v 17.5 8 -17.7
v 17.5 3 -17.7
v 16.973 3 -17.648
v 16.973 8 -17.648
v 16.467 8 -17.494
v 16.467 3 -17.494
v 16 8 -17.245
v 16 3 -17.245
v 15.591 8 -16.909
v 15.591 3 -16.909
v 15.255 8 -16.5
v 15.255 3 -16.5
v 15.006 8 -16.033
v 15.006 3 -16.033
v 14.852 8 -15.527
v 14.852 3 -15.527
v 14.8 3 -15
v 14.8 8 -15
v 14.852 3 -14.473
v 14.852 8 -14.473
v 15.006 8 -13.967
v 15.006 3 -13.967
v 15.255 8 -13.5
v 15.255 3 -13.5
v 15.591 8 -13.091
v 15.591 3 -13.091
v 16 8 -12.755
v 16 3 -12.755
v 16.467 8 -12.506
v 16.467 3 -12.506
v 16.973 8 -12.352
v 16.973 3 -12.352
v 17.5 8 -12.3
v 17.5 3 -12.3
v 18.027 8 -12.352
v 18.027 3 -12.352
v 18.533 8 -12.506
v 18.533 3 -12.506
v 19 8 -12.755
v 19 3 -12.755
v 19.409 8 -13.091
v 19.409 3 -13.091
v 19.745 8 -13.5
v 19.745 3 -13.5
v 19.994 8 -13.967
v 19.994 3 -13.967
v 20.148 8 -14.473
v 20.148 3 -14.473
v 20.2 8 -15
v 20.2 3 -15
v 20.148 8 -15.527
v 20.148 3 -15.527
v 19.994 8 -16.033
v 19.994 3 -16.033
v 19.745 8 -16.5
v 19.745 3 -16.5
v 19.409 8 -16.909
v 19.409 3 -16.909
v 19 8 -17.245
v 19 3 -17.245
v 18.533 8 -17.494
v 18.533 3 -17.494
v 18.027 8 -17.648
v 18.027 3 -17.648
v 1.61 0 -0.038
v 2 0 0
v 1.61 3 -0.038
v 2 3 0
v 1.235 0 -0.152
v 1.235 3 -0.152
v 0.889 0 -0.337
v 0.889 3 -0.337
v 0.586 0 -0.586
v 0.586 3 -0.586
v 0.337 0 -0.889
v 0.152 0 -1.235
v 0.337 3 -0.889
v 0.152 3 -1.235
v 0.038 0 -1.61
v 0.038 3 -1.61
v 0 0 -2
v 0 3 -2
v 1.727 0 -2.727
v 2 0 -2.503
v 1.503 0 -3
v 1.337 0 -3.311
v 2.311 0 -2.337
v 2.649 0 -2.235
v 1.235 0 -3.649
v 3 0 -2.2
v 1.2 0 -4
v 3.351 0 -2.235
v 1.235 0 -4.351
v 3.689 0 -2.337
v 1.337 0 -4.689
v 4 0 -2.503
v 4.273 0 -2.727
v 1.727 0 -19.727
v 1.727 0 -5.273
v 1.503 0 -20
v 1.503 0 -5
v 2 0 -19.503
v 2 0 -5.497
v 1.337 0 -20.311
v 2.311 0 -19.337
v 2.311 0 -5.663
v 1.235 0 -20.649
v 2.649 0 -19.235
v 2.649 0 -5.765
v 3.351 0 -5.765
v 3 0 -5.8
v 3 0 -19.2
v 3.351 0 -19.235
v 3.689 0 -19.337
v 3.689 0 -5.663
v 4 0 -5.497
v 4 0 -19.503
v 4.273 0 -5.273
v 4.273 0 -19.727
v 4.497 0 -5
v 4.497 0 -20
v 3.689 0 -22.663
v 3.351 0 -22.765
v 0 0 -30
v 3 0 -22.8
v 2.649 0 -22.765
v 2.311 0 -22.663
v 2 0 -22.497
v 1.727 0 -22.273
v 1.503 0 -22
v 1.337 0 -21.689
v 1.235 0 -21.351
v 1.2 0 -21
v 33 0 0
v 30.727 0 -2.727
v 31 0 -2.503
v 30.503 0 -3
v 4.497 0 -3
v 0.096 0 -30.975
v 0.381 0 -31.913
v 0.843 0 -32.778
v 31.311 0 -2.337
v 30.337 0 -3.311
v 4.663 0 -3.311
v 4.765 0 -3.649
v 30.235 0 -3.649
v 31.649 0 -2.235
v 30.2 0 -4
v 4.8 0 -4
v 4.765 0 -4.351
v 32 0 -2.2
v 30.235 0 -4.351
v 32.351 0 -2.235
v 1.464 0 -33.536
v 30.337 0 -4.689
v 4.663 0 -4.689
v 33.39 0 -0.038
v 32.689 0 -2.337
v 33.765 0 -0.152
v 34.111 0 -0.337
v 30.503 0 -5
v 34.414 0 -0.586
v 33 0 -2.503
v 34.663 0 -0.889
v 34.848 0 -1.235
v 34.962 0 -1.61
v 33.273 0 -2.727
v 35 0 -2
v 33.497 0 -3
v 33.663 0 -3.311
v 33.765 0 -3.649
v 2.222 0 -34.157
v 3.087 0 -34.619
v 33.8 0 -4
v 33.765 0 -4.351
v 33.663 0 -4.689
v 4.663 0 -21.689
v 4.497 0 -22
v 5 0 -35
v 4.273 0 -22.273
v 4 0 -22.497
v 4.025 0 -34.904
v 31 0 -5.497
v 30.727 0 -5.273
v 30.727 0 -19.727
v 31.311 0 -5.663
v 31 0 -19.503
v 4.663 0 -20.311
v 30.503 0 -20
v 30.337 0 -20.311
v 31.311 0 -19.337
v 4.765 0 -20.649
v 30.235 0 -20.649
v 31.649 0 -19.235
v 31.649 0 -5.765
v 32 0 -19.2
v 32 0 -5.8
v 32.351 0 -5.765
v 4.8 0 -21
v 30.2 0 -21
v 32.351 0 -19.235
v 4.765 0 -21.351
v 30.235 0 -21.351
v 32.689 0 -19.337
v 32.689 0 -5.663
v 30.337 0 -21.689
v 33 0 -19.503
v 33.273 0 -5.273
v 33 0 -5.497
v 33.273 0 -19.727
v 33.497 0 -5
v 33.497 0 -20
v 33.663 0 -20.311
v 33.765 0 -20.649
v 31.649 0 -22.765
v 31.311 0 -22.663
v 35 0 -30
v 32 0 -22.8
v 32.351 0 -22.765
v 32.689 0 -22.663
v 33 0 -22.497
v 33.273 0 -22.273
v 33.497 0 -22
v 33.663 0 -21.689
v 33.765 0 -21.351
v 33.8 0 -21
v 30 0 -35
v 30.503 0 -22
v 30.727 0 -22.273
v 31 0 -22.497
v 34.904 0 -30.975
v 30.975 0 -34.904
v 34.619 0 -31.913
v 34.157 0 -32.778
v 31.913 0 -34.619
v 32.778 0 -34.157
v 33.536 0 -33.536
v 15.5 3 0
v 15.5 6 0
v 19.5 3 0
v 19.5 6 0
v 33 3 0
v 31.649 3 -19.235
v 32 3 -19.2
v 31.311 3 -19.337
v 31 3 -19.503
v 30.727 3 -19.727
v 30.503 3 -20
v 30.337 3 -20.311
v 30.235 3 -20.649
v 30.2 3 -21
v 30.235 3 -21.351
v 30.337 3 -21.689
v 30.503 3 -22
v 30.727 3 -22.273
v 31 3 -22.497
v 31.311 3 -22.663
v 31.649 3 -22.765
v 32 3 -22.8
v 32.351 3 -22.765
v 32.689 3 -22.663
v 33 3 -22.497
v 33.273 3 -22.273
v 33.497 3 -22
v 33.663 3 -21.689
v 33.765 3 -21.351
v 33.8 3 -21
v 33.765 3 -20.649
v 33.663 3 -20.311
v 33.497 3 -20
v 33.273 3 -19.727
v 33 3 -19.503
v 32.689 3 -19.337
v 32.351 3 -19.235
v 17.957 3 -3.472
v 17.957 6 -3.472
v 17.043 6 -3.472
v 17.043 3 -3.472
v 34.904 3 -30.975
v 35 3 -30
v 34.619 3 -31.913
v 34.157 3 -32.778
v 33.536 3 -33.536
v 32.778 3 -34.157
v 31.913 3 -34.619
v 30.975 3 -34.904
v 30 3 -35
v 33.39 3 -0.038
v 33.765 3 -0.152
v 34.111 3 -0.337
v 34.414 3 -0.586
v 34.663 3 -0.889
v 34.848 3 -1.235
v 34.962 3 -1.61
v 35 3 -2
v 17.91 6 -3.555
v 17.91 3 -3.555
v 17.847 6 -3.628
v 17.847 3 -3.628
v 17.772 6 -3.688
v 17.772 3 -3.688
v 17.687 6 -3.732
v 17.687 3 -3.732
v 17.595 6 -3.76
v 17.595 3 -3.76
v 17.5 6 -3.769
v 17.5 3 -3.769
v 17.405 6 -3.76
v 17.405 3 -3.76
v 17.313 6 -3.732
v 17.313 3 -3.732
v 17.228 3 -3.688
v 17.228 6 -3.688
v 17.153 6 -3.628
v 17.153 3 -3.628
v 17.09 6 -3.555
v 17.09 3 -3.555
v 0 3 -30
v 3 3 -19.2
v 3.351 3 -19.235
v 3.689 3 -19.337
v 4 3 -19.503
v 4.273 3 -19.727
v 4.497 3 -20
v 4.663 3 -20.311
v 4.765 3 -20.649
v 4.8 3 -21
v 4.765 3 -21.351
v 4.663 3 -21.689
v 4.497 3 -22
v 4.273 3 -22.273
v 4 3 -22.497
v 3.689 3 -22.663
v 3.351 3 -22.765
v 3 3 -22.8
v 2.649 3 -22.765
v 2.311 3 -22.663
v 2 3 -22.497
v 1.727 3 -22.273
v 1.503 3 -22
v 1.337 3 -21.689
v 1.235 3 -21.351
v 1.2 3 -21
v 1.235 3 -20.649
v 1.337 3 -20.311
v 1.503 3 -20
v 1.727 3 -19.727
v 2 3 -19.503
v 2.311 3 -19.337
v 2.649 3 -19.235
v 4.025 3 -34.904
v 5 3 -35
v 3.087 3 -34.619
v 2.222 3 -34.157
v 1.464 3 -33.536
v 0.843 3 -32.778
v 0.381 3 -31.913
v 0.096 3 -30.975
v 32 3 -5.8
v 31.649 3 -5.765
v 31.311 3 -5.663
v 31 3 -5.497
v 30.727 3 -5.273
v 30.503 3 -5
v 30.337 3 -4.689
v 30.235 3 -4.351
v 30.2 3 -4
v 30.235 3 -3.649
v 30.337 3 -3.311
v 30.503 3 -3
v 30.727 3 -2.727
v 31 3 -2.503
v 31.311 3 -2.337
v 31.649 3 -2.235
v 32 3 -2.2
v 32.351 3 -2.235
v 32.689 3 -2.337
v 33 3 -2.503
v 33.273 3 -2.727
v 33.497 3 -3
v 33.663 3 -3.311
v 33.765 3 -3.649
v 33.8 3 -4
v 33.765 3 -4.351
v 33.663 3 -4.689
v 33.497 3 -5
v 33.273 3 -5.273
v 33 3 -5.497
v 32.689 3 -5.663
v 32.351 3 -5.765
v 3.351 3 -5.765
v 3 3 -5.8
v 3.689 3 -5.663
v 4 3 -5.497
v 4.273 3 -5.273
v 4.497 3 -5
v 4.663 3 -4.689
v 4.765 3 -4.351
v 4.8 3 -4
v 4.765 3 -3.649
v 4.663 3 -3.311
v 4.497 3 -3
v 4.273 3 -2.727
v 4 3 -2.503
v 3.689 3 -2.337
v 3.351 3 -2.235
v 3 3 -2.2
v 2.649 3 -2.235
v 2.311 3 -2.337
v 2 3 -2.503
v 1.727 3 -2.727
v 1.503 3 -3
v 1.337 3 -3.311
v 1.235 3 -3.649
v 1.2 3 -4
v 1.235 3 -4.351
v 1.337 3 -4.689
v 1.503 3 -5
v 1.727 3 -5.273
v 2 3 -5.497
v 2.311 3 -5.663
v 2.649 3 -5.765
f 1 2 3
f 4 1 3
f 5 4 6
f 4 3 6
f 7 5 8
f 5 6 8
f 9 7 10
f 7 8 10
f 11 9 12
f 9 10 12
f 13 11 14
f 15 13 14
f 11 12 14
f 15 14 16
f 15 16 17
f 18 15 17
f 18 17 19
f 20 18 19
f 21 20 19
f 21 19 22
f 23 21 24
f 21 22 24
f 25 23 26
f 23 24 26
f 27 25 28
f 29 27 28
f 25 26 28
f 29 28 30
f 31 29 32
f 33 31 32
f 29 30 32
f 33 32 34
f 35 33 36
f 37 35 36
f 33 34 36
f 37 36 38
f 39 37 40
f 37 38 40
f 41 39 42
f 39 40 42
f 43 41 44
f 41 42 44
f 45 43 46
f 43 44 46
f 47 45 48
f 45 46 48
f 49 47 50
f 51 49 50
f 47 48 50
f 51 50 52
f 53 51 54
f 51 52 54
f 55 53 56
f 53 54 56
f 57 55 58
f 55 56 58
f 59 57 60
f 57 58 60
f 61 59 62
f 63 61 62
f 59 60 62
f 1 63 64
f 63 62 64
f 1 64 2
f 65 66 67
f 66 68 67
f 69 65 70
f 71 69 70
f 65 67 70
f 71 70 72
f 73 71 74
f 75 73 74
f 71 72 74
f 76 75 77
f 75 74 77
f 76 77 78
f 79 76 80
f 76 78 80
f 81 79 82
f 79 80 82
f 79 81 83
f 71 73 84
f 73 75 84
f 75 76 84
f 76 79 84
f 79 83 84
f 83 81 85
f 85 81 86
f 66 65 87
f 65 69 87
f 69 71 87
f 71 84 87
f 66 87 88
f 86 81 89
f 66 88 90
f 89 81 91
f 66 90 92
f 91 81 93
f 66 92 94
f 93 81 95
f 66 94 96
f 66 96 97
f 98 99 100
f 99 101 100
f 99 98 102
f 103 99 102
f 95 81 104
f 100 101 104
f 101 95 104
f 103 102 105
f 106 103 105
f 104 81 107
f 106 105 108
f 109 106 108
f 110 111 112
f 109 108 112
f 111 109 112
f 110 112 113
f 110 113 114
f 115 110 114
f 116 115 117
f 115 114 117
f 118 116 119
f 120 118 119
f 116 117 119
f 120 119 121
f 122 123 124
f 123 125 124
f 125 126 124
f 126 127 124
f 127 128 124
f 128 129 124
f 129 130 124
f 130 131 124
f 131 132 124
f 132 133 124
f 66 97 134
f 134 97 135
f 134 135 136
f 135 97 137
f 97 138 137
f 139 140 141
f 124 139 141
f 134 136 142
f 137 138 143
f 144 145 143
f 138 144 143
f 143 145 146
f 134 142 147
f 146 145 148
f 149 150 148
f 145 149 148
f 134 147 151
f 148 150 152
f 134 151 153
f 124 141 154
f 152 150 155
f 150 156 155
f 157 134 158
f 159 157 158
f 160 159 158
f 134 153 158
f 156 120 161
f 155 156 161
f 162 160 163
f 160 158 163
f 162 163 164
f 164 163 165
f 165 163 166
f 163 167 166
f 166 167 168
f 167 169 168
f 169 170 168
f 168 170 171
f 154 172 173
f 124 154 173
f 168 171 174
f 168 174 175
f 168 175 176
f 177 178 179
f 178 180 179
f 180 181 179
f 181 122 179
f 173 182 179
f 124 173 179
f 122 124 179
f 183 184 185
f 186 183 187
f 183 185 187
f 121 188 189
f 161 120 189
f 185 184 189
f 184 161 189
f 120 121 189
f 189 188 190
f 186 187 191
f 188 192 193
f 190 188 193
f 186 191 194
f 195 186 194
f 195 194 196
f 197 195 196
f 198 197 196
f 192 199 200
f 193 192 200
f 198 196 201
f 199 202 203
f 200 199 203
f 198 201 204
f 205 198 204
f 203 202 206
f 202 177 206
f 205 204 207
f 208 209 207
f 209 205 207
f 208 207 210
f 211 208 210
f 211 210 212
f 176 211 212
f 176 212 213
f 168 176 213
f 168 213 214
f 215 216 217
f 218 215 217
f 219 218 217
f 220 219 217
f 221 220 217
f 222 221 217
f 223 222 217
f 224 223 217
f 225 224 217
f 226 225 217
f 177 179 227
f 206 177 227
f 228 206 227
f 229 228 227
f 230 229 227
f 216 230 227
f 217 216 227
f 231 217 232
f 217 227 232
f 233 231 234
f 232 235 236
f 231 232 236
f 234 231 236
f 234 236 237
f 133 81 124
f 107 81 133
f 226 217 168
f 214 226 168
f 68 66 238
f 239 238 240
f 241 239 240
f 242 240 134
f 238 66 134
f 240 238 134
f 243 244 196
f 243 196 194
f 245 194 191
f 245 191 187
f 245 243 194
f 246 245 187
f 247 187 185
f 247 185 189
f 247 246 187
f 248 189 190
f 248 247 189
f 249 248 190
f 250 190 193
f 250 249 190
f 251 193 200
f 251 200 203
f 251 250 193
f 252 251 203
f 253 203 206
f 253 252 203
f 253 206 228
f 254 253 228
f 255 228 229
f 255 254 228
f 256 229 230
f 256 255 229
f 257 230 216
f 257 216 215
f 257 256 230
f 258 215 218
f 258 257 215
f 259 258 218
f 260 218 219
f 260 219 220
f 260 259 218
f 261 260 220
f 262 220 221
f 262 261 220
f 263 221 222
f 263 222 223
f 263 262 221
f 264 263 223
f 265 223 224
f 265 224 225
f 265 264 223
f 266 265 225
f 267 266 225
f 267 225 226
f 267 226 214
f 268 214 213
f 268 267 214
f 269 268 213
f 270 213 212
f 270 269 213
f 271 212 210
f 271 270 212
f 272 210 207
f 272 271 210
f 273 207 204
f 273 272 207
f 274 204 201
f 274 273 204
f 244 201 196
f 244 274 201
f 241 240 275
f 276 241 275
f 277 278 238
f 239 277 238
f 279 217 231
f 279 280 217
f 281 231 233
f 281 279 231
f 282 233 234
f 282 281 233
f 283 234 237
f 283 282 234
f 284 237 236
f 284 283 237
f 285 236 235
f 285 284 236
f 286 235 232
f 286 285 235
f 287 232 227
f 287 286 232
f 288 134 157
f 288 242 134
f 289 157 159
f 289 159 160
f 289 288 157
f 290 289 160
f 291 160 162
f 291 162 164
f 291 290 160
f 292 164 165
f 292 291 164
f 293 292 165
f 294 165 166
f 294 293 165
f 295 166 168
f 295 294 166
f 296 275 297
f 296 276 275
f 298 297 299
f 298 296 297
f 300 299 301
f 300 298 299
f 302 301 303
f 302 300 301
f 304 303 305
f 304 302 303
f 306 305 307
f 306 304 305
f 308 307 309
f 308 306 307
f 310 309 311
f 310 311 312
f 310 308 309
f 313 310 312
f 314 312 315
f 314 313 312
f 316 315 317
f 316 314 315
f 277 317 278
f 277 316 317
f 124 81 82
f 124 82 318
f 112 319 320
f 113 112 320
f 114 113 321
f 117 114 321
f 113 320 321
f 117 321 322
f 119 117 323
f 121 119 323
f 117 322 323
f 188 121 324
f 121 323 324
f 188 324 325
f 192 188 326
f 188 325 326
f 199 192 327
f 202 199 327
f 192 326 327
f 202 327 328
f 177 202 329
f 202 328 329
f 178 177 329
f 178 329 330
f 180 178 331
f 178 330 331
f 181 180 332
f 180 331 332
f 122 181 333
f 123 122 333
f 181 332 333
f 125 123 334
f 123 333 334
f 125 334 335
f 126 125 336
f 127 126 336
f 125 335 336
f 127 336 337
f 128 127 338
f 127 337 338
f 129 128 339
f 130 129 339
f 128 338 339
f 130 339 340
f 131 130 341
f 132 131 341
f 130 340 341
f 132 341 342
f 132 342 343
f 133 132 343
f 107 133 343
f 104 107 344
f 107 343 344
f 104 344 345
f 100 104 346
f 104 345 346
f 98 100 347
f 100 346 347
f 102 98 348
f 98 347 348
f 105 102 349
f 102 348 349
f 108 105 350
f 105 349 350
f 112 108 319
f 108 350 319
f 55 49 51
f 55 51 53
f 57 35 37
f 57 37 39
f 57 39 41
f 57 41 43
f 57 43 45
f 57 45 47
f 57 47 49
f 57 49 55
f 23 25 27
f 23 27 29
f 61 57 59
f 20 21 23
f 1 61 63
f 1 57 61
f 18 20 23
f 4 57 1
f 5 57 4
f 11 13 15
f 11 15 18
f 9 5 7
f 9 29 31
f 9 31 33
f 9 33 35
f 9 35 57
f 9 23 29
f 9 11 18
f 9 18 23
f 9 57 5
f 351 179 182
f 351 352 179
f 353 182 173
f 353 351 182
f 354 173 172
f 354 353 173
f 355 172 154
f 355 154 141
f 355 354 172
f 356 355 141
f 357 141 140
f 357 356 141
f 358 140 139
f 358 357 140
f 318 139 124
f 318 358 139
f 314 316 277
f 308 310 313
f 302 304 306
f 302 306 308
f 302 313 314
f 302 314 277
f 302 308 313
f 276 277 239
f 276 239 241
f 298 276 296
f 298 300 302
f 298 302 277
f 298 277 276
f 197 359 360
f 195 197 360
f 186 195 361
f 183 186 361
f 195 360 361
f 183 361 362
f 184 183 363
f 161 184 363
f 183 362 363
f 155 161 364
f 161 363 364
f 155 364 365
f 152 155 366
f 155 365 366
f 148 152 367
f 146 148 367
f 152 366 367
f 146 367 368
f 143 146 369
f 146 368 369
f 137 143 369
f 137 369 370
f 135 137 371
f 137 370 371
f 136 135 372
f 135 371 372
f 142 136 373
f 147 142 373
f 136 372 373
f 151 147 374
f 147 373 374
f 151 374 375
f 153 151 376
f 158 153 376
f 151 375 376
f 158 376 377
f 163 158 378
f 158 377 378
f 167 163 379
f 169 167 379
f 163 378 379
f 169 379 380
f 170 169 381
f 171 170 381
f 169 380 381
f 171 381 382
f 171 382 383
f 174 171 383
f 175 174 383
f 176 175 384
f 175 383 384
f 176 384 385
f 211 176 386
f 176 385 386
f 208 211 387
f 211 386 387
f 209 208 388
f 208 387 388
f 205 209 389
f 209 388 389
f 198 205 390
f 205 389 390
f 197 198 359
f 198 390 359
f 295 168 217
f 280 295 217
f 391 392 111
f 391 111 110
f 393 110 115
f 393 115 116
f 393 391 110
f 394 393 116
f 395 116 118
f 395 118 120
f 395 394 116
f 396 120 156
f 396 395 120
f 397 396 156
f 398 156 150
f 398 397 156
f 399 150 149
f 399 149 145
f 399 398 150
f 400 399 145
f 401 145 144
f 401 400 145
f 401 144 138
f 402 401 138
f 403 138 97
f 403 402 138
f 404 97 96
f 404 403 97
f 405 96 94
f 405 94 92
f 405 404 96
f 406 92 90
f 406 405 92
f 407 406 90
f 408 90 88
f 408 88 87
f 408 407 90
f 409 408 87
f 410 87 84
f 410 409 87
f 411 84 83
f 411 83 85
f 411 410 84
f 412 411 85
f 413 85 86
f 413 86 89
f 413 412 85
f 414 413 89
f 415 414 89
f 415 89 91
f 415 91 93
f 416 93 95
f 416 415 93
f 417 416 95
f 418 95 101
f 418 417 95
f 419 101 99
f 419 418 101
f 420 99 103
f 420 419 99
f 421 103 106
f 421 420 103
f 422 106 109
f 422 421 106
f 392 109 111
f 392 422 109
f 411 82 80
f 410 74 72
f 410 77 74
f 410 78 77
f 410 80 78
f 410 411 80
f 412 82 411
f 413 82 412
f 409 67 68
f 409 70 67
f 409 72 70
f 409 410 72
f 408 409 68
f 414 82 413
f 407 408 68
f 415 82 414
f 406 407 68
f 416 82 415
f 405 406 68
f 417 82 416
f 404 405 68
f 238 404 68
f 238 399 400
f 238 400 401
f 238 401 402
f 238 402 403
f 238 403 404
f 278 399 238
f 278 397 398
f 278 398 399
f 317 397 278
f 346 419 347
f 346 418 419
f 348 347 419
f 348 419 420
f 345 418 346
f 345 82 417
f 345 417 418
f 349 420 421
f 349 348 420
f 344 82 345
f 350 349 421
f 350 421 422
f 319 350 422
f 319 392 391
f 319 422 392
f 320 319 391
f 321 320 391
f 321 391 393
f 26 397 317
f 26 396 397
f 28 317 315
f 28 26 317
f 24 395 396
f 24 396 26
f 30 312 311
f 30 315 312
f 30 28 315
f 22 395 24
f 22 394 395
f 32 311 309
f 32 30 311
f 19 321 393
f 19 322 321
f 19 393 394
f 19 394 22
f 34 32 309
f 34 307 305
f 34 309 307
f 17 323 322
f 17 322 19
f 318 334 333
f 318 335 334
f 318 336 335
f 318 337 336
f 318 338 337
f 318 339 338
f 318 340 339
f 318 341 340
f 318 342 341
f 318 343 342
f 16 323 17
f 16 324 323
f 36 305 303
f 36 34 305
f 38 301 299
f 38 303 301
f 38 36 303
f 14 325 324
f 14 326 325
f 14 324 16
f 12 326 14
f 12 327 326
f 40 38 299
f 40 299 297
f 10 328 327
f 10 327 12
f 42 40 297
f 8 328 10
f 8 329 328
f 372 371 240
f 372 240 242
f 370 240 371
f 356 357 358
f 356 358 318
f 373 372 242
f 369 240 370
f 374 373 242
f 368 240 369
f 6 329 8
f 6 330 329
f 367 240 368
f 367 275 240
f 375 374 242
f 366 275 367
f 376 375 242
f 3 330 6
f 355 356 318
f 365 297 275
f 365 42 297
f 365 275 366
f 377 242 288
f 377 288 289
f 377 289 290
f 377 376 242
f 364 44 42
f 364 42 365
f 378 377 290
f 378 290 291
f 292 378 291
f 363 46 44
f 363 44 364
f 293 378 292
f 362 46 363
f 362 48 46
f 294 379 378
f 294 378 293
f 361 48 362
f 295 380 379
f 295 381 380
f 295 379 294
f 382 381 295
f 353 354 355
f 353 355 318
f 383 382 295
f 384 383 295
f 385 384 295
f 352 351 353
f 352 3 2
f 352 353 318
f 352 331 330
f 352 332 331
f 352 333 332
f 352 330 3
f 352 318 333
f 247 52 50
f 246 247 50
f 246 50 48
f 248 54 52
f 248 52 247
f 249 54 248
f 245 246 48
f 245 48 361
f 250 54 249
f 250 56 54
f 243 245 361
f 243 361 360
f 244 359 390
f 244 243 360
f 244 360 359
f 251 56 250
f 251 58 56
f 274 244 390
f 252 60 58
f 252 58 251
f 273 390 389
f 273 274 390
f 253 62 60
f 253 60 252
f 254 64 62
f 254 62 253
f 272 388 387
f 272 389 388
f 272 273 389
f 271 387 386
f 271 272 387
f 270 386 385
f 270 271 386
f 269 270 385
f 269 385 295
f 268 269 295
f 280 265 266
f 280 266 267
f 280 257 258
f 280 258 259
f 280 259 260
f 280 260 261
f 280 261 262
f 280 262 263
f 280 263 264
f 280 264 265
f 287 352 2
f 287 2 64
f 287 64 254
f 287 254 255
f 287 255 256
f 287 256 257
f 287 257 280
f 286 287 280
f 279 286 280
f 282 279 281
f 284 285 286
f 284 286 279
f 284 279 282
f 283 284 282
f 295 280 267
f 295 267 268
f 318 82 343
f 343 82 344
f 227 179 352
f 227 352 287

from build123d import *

# Parameters (mm, degrees)
SKETCH1_W               = 35
SKETCH1_H               = 35
BOSS_EXTRUDE1_DEPTH     = 3
SKETCH3_R               = 1.8
CUT_EXTRUDE2_DEPTH      = 3
MIRROR2_COPY_1_SKETCH_R = 1.8
MIRROR2_COPY_1_DEPTH    = 3
SKETCH2_R               = 2.7
BOSS_EXTRUDE2_DEPTH     = 5
BOSS_EXTRUDE3_DEPTH     = 3
FILLET2_R               = 0.5
FILLET3_R               = 2
FILLET4_R               = 5


with BuildPart() as part:
    # Sketch1 → Boss-Extrude1 (new body)
    with BuildSketch(Plane(origin=(0, 0, 0), x_dir=(1, 0, 0), z_dir=(0, 1, 0))):
        with Locations((17.5, 17.5)):
            Rectangle(SKETCH1_W, SKETCH1_H)
    extrude(amount=BOSS_EXTRUDE1_DEPTH)

    # Sketch3 → Cut-Extrude2 (cut)
    with BuildSketch(Plane(origin=(0, 3, 0), x_dir=(1, 0, 0), z_dir=(0, 1, 0))):
        with Locations(Location((3, 21, 0), (0, 0, 270))):
            Circle(SKETCH3_R)
    cut_extrude2 = extrude(amount=-CUT_EXTRUDE2_DEPTH, mode=Mode.SUBTRACT)

    # Mirror1: Cut-Extrude2 across plane
    add(cut_extrude2.mirror(Plane.XY.offset(-12.5)), mode=Mode.SUBTRACT)

    # Mirror2: Cut-Extrude2 across plane
    add(cut_extrude2.mirror(Plane(origin=(17.5, 0, 0), x_dir=(0, 0, 1), z_dir=(1, 0, 0))), mode=Mode.SUBTRACT)

    # Mirror2 copy 1 sketch → Mirror2 copy 1 (cut)
    with BuildSketch(Plane(origin=(35, 3, -25), x_dir=(-1, 0, 0), z_dir=(0, 1, 0))):
        with Locations(Location((3, 21, 0), (0, 0, 270))):
            Circle(MIRROR2_COPY_1_SKETCH_R)
    extrude(amount=-MIRROR2_COPY_1_DEPTH, mode=Mode.SUBTRACT)

    # Sketch2 → Boss-Extrude2 (add)
    with BuildSketch(Plane(origin=(0, 3, 0), x_dir=(1, 0, 0), z_dir=(0, 1, 0))):
        with Locations(Location((17.5, 15, 0), (0, 0, 90))):
            Circle(SKETCH2_R)
    extrude(amount=BOSS_EXTRUDE2_DEPTH)

    # Sketch5 → Boss-Extrude3 (add)
    with BuildSketch(Plane(origin=(0, 3, 0), x_dir=(1, 0, 0), z_dir=(0, 1, 0))):
        Polygon((17.5, 4.5), (15.5, 0), (19.5, 0), align=None)
    extrude(amount=BOSS_EXTRUDE3_DEPTH)

    # Fillet2
    fillet2_edges = [part.edges().sort_by_distance(p)[0] for p in [
        (17.5, 4.5, -4.5),
    ]]
    fillet(fillet2_edges, radius=FILLET2_R)

    # Fillet3
    fillet3_edges = [part.edges().sort_by_distance(p)[0] for p in [
        (35, 1.5, 0),
        (0, 1.5, 0),
    ]]
    fillet(fillet3_edges, radius=FILLET3_R)

    # Fillet4
    fillet4_edges = [part.edges().sort_by_distance(p)[0] for p in [
        (0, 1.5, -35),
        (35, 1.5, -35),
    ]]
    fillet(fillet4_edges, radius=FILLET4_R)


solid = part.part
